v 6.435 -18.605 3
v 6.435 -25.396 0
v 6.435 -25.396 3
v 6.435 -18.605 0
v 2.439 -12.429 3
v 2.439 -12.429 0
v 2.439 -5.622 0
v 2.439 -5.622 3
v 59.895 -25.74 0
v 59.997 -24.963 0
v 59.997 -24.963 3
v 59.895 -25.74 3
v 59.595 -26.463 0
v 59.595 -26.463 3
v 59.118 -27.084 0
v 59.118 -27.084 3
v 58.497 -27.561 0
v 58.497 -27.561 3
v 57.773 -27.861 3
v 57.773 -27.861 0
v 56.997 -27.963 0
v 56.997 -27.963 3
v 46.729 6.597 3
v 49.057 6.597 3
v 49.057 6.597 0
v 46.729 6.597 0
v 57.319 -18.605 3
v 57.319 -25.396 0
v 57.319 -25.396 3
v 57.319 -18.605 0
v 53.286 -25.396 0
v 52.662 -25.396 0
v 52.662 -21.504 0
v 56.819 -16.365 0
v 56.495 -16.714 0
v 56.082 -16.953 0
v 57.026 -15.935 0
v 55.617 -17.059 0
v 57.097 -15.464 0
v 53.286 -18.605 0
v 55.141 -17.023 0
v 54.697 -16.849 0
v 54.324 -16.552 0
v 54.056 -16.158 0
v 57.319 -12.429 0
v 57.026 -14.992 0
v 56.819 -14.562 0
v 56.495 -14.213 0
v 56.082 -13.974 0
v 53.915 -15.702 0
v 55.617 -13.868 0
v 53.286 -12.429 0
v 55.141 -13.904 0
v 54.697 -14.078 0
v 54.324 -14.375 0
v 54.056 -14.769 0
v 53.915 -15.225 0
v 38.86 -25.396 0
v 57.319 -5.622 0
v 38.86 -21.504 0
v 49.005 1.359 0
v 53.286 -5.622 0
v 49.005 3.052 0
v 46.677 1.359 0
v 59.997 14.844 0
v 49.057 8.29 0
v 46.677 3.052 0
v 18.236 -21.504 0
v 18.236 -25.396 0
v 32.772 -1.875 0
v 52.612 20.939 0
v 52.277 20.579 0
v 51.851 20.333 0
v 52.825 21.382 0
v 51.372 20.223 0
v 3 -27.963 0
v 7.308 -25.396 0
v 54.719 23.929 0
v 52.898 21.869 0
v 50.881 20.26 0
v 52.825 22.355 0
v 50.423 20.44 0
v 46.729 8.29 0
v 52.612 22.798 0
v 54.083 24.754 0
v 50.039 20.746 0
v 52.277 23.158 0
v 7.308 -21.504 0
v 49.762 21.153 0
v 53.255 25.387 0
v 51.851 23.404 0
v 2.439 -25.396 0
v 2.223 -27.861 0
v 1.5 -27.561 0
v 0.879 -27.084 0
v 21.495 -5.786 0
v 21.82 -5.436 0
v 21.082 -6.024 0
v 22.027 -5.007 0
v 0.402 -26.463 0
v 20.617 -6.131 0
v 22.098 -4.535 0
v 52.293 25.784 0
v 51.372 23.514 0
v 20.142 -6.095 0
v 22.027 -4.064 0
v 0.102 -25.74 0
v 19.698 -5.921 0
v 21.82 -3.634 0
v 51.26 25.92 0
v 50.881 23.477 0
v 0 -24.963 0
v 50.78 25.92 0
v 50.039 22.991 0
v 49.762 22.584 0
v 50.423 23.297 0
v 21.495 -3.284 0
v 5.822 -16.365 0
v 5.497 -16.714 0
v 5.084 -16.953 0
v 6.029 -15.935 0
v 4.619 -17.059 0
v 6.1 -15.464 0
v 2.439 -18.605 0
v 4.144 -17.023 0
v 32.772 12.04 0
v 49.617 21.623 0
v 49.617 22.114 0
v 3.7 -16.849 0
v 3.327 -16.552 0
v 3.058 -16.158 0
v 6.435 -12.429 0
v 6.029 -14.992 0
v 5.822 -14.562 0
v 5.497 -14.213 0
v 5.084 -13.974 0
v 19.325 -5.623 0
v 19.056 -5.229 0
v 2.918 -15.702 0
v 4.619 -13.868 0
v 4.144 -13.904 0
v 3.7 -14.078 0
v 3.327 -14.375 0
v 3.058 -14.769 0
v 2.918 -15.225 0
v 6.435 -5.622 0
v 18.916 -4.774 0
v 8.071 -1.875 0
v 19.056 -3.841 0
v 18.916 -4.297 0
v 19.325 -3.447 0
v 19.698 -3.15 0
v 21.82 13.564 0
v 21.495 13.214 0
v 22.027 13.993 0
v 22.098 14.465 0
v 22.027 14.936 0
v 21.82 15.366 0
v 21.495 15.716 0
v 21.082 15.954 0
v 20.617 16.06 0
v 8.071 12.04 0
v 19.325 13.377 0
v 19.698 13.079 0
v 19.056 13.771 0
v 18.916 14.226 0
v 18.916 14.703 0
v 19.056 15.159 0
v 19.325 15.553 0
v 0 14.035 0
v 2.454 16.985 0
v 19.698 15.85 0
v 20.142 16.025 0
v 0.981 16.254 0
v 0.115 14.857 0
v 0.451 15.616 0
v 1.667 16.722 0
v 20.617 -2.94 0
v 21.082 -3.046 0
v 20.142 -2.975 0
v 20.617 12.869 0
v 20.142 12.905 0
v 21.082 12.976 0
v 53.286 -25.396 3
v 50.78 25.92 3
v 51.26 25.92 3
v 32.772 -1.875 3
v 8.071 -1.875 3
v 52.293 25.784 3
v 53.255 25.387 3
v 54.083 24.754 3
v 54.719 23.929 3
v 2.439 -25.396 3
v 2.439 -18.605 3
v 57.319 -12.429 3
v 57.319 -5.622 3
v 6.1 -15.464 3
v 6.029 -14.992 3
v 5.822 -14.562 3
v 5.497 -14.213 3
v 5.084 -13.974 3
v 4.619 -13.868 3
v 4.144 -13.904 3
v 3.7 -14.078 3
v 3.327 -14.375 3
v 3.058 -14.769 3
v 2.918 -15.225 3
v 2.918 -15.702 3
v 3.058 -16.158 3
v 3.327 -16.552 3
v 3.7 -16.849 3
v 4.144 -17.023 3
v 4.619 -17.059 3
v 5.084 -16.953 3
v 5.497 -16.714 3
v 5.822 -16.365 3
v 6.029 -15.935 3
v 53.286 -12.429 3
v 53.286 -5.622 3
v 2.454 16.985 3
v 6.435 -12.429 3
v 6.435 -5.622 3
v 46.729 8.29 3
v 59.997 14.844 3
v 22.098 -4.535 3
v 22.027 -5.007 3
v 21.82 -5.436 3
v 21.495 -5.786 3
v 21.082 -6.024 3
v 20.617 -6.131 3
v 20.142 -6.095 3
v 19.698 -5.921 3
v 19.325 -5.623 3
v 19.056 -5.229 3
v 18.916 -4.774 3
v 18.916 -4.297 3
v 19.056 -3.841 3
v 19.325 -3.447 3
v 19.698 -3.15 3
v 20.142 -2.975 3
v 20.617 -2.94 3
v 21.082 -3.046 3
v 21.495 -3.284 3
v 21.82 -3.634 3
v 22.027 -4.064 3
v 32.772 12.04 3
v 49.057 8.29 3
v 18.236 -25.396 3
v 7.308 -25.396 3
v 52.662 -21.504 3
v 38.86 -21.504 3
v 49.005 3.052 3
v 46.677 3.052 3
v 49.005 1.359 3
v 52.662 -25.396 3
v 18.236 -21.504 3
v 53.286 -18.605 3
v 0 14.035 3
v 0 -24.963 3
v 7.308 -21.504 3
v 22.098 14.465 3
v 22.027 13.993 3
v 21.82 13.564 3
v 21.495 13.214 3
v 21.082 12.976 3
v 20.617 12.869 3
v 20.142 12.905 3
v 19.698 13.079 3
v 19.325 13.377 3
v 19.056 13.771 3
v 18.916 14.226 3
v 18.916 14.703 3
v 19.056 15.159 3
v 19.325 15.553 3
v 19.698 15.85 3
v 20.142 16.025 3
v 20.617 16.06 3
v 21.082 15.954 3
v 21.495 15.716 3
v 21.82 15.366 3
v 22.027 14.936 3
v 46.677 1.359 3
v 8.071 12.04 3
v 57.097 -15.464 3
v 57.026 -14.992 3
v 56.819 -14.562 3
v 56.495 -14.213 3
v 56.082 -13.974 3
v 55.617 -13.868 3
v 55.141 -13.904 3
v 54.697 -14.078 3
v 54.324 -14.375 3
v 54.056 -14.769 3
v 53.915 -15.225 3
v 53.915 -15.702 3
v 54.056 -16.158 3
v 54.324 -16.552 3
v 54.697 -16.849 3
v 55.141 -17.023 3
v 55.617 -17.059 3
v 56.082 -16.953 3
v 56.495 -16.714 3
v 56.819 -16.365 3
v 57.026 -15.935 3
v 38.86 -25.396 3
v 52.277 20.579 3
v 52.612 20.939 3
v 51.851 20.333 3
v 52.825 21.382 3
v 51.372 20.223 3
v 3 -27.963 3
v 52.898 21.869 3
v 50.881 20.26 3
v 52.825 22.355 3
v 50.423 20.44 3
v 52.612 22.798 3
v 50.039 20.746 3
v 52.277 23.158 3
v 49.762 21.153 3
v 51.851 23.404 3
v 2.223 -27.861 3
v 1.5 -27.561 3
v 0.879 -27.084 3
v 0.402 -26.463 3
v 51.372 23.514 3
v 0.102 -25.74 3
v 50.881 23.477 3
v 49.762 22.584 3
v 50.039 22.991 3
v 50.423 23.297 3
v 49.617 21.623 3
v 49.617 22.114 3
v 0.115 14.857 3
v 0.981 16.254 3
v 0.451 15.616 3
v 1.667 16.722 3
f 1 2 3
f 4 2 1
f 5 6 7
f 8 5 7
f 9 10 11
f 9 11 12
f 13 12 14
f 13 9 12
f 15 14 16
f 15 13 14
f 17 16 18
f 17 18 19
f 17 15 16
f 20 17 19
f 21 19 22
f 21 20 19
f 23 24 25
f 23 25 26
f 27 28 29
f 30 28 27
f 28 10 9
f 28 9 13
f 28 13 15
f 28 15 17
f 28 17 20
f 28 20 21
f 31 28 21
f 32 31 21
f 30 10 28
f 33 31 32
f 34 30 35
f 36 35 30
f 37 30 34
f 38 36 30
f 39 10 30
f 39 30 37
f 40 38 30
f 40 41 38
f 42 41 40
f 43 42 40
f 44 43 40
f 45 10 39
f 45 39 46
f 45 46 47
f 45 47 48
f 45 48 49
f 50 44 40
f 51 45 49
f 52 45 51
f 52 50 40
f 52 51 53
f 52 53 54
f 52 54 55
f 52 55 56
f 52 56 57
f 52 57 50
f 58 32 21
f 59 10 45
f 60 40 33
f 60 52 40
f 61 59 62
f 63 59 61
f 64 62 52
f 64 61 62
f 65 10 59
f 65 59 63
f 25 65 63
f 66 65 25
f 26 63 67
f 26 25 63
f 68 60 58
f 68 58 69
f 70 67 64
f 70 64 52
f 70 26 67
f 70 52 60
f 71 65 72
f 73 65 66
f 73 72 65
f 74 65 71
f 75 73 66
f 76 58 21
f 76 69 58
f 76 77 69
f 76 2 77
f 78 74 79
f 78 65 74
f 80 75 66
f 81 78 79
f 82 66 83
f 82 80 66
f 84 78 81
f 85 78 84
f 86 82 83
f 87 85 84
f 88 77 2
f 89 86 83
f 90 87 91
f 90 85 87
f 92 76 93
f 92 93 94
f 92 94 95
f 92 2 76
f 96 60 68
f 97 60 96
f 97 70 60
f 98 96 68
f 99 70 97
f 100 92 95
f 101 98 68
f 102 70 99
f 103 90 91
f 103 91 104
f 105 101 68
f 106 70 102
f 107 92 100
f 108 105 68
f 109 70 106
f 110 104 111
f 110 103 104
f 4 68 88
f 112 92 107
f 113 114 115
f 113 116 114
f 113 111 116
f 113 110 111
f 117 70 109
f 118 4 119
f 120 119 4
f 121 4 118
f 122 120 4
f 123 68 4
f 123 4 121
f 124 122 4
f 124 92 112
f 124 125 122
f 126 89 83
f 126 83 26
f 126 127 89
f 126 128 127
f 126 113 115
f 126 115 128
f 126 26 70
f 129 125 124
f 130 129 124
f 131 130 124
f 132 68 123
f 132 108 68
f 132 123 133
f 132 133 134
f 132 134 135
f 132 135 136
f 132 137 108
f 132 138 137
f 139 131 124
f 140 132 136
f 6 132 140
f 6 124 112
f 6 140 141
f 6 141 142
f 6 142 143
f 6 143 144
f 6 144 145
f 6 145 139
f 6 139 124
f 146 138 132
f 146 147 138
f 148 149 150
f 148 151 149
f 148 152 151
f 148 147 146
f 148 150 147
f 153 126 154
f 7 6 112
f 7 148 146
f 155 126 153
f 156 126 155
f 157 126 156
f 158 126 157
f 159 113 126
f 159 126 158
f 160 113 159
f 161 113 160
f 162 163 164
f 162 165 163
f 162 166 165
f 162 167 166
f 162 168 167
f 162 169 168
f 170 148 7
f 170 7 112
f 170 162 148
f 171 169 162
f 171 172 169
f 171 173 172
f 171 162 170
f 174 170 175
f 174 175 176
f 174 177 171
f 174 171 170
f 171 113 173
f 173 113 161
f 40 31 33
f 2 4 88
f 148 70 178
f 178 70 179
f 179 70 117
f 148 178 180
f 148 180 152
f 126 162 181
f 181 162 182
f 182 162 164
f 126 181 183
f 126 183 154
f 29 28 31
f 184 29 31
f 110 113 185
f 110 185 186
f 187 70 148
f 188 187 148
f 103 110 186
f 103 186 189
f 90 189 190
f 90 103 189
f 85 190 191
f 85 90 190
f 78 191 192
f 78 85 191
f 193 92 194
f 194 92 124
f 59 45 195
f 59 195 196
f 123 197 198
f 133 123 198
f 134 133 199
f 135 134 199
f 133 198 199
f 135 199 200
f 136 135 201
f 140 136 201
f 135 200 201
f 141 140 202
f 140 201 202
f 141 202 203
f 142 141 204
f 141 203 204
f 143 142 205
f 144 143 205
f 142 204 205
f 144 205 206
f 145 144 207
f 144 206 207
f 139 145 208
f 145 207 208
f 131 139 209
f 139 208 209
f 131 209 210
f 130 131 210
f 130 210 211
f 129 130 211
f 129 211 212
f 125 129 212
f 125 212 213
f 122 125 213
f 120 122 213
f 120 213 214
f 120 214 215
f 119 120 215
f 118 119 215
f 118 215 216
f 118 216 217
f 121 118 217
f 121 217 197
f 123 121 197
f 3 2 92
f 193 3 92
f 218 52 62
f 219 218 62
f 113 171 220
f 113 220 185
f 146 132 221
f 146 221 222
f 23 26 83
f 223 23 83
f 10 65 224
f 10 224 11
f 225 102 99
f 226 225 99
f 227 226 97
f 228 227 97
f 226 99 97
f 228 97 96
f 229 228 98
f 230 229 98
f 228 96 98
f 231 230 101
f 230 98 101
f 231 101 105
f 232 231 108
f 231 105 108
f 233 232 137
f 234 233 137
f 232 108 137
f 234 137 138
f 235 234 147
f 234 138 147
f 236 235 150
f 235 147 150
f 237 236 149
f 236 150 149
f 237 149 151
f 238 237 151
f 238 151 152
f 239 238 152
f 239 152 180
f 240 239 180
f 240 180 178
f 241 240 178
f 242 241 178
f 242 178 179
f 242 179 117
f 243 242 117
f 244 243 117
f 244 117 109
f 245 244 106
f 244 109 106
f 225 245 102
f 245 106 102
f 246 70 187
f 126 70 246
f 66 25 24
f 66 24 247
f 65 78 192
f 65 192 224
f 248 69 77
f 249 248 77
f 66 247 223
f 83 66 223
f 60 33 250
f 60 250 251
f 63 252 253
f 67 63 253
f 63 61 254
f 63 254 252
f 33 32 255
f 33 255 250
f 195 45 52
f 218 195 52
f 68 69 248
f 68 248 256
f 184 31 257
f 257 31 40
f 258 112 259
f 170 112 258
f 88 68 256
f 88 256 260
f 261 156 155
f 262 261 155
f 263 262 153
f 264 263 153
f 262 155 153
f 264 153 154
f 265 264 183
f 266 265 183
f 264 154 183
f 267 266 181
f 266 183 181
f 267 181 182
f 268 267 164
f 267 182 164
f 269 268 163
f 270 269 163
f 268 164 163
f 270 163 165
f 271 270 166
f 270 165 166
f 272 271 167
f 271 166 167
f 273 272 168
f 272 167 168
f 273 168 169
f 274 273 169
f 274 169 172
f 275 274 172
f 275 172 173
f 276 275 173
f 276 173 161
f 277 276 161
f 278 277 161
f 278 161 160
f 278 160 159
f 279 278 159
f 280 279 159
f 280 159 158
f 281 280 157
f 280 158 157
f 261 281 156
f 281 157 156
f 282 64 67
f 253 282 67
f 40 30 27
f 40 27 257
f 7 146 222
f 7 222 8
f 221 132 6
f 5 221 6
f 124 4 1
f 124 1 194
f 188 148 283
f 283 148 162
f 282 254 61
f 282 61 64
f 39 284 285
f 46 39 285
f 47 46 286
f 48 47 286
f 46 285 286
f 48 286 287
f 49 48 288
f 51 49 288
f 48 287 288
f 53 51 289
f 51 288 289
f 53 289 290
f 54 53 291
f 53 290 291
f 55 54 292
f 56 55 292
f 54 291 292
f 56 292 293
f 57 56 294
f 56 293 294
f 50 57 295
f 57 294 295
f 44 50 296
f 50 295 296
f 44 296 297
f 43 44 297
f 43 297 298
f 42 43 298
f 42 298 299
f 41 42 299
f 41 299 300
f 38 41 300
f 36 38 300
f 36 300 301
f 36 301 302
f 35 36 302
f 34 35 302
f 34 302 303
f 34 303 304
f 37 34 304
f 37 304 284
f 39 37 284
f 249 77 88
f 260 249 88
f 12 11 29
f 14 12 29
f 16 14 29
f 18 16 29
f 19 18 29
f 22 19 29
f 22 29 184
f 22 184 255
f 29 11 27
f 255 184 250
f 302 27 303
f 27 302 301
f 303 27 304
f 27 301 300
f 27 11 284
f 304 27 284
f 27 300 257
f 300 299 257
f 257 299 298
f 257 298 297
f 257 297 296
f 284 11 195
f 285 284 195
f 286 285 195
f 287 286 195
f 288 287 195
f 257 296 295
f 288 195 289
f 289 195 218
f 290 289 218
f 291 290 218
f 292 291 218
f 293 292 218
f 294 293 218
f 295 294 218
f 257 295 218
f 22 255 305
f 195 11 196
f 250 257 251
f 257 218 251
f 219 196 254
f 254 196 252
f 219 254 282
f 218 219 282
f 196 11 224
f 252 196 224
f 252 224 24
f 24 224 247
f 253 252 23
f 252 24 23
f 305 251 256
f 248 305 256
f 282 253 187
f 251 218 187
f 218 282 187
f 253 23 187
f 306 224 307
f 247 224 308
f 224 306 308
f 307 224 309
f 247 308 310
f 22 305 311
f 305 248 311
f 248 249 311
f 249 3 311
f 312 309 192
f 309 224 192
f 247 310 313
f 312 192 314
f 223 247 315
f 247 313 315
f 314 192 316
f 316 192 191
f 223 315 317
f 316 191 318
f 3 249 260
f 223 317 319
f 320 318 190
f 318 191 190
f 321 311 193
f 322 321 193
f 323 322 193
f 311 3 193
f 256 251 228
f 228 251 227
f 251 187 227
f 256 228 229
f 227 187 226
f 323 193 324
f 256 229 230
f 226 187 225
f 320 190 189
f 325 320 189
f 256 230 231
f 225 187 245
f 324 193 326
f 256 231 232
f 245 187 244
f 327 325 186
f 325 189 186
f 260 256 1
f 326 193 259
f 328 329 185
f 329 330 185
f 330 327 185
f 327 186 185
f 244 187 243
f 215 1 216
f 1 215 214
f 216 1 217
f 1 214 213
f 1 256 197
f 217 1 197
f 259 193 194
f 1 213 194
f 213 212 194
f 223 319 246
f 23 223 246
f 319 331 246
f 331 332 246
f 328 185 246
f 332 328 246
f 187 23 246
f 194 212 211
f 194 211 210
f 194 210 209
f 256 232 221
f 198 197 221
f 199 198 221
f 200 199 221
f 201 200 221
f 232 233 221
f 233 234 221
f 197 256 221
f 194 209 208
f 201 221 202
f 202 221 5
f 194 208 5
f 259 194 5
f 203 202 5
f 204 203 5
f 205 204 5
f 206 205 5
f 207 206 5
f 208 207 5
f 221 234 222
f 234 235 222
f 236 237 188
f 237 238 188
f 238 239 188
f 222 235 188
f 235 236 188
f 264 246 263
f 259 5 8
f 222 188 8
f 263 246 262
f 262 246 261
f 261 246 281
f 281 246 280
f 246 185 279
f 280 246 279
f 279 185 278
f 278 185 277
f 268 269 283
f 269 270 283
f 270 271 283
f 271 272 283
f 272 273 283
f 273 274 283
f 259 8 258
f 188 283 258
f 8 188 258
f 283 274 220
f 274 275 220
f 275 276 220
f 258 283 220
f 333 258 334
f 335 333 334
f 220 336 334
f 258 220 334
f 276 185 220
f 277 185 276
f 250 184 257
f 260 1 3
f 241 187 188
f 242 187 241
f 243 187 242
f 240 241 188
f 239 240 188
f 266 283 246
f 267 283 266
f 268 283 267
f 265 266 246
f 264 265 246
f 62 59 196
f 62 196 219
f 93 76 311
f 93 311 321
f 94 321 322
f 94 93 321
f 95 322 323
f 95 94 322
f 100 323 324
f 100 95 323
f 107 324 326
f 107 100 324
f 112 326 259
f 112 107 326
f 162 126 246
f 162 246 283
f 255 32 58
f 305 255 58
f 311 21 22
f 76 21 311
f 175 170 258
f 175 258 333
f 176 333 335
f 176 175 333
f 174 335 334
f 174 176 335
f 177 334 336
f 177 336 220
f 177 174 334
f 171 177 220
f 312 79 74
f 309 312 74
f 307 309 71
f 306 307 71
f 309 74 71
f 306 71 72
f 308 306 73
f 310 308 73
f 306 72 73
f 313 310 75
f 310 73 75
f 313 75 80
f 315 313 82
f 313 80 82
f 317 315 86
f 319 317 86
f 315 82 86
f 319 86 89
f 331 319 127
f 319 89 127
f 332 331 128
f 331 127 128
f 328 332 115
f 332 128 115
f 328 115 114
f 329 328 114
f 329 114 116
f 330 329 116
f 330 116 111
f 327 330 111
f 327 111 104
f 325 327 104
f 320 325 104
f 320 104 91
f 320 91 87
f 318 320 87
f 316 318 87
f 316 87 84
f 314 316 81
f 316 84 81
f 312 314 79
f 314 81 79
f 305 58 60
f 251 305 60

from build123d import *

# Parameters (mm, degrees)
SKETCH_1_R          = 1.358928477
SKETCH_1_R_2        = 1.599915794
SKETCH_1_R_3        = 1.649913162
SKETCH_1_W          = 3.996376927
SKETCH_1_H          = 6.806421868
SKETCH_1_H_2        = 6.790704991
SKETCH_1_W_2        = 4.032106697
SKETCH_1_W_3        = 10.92790885
SKETCH_1_H_3        = 3.891970495
SKETCH_1_W_4        = 13.80275679
SKETCH_1_W_5        = 2.328877428
SKETCH_1_H_4        = 1.692910899
SKETCH_1_W_6        = 2.328877427
SKETCH_1_H_5        = 1.6929109
SKETCH_1_W_7        = 24.700449722
SKETCH_1_H_6        = 13.915746322
EXTRUDE_1_DEPTH     = 3
SKETCH_2_R          = 1.6
CUT_EXTRUDE_1_DEPTH = 67.261211836


with BuildPart() as part:
    # 草图1 → 凸台-拉伸1 (new body)
    with BuildSketch(Plane(origin=(0, 0, 0), x_dir=(-1, 0, 0), z_dir=(0, 0, -1))):
        with BuildLine():
            Line((-56.997000158, -27.962959634), (-2.999842114, -27.962959634))
            ThreePointArc((-2.999842114, -27.962959634), (-0.878633413, -27.084326221), (0, -24.96311752))
            Line((0, -24.96311752), (0, 14.034849413))
            ThreePointArc((0, 14.034849413), (-0.693847958, 15.953558265), (-2.454424946, 16.984692259))
            Line((-2.454424946, 16.984692259), (-50.77996637, 25.919941108))
            Line((-50.77996637, 25.919941108), (-51.260080297, 25.919941108))
            ThreePointArc((-51.260080297, 25.919941108), (-53.255311763, 25.386759089), (-54.718604462, 23.929362046))
            Line((-54.718604462, 23.929362046), (-59.996842271, 14.843746718))
            Line((-59.996842271, 14.843746718), (-59.996842271, -24.96311752))
            ThreePointArc((-59.996842271, -24.96311752), (-59.118208859, -27.084326221), (-56.997000158, -27.962959634))
        make_face()
        with Locations(Location((-55.497079101, -15.463517499, 0), (0, 0, 180))):
            Circle(SKETCH_1_R, mode=Mode.SUBTRACT)
        with Locations(Location((-4.49976317, -15.463517499, 0), (0, 0, 180))):
            Circle(SKETCH_1_R, mode=Mode.SUBTRACT)
        with Locations(Location((-20.497921162, -4.53509268, 0), (0, 0, 180))):
            Circle(SKETCH_1_R_2, mode=Mode.SUBTRACT)
        with Locations(Location((-20.497921162, 14.46490732, 0), (0, 0, 180))):
            Circle(SKETCH_1_R_2, mode=Mode.SUBTRACT)
        with Locations(Location((-51.248302721, 21.868517657, 0), (0, 0, 180))):
            Circle(SKETCH_1_R_3, mode=Mode.SUBTRACT)
        with Locations((-4.436721131, -9.025383771)):
            Rectangle(SKETCH_1_W, SKETCH_1_H, mode=Mode.SUBTRACT)
        with Locations((-4.436721131, -22.000344001)):
            Rectangle(SKETCH_1_W, SKETCH_1_H_2, mode=Mode.SUBTRACT)
        with Locations((-55.302485972, -22.000344001)):
            Rectangle(SKETCH_1_W_2, SKETCH_1_H_2, mode=Mode.SUBTRACT)
        with Locations((-55.302485972, -9.025383771)):
            Rectangle(SKETCH_1_W_2, SKETCH_1_H, mode=Mode.SUBTRACT)
        with Locations((-12.771799921, -23.449711249)):
            Rectangle(SKETCH_1_W_3, SKETCH_1_H_3, mode=Mode.SUBTRACT)
        with Locations((-45.760922572, -23.449711249)):
            Rectangle(SKETCH_1_W_4, SKETCH_1_H_3, mode=Mode.SUBTRACT)
        with Locations((-47.892979317, 7.443776854)):
            Rectangle(SKETCH_1_W_5, SKETCH_1_H_4, mode=Mode.SUBTRACT)
        with Locations((-47.840982053, 2.205052576)):
            Rectangle(SKETCH_1_W_6, SKETCH_1_H_5, mode=Mode.SUBTRACT)
        with Locations((-20.421644705, 5.082457397)):
            Rectangle(SKETCH_1_W_7, SKETCH_1_H_6, mode=Mode.SUBTRACT)
    extrude(amount=-EXTRUDE_1_DEPTH)

    # 草图2 → 切除-拉伸1 (cut, through all)
    with BuildSketch(Plane.XY.offset(3)):
        with Locations((55.497079101, -15.463517499)):
            Circle(SKETCH_2_R)
        with Locations((4.49976317, -15.463517499)):
            Circle(SKETCH_2_R)
    extrude(amount=-CUT_EXTRUDE_1_DEPTH, mode=Mode.SUBTRACT)


solid = part.part
